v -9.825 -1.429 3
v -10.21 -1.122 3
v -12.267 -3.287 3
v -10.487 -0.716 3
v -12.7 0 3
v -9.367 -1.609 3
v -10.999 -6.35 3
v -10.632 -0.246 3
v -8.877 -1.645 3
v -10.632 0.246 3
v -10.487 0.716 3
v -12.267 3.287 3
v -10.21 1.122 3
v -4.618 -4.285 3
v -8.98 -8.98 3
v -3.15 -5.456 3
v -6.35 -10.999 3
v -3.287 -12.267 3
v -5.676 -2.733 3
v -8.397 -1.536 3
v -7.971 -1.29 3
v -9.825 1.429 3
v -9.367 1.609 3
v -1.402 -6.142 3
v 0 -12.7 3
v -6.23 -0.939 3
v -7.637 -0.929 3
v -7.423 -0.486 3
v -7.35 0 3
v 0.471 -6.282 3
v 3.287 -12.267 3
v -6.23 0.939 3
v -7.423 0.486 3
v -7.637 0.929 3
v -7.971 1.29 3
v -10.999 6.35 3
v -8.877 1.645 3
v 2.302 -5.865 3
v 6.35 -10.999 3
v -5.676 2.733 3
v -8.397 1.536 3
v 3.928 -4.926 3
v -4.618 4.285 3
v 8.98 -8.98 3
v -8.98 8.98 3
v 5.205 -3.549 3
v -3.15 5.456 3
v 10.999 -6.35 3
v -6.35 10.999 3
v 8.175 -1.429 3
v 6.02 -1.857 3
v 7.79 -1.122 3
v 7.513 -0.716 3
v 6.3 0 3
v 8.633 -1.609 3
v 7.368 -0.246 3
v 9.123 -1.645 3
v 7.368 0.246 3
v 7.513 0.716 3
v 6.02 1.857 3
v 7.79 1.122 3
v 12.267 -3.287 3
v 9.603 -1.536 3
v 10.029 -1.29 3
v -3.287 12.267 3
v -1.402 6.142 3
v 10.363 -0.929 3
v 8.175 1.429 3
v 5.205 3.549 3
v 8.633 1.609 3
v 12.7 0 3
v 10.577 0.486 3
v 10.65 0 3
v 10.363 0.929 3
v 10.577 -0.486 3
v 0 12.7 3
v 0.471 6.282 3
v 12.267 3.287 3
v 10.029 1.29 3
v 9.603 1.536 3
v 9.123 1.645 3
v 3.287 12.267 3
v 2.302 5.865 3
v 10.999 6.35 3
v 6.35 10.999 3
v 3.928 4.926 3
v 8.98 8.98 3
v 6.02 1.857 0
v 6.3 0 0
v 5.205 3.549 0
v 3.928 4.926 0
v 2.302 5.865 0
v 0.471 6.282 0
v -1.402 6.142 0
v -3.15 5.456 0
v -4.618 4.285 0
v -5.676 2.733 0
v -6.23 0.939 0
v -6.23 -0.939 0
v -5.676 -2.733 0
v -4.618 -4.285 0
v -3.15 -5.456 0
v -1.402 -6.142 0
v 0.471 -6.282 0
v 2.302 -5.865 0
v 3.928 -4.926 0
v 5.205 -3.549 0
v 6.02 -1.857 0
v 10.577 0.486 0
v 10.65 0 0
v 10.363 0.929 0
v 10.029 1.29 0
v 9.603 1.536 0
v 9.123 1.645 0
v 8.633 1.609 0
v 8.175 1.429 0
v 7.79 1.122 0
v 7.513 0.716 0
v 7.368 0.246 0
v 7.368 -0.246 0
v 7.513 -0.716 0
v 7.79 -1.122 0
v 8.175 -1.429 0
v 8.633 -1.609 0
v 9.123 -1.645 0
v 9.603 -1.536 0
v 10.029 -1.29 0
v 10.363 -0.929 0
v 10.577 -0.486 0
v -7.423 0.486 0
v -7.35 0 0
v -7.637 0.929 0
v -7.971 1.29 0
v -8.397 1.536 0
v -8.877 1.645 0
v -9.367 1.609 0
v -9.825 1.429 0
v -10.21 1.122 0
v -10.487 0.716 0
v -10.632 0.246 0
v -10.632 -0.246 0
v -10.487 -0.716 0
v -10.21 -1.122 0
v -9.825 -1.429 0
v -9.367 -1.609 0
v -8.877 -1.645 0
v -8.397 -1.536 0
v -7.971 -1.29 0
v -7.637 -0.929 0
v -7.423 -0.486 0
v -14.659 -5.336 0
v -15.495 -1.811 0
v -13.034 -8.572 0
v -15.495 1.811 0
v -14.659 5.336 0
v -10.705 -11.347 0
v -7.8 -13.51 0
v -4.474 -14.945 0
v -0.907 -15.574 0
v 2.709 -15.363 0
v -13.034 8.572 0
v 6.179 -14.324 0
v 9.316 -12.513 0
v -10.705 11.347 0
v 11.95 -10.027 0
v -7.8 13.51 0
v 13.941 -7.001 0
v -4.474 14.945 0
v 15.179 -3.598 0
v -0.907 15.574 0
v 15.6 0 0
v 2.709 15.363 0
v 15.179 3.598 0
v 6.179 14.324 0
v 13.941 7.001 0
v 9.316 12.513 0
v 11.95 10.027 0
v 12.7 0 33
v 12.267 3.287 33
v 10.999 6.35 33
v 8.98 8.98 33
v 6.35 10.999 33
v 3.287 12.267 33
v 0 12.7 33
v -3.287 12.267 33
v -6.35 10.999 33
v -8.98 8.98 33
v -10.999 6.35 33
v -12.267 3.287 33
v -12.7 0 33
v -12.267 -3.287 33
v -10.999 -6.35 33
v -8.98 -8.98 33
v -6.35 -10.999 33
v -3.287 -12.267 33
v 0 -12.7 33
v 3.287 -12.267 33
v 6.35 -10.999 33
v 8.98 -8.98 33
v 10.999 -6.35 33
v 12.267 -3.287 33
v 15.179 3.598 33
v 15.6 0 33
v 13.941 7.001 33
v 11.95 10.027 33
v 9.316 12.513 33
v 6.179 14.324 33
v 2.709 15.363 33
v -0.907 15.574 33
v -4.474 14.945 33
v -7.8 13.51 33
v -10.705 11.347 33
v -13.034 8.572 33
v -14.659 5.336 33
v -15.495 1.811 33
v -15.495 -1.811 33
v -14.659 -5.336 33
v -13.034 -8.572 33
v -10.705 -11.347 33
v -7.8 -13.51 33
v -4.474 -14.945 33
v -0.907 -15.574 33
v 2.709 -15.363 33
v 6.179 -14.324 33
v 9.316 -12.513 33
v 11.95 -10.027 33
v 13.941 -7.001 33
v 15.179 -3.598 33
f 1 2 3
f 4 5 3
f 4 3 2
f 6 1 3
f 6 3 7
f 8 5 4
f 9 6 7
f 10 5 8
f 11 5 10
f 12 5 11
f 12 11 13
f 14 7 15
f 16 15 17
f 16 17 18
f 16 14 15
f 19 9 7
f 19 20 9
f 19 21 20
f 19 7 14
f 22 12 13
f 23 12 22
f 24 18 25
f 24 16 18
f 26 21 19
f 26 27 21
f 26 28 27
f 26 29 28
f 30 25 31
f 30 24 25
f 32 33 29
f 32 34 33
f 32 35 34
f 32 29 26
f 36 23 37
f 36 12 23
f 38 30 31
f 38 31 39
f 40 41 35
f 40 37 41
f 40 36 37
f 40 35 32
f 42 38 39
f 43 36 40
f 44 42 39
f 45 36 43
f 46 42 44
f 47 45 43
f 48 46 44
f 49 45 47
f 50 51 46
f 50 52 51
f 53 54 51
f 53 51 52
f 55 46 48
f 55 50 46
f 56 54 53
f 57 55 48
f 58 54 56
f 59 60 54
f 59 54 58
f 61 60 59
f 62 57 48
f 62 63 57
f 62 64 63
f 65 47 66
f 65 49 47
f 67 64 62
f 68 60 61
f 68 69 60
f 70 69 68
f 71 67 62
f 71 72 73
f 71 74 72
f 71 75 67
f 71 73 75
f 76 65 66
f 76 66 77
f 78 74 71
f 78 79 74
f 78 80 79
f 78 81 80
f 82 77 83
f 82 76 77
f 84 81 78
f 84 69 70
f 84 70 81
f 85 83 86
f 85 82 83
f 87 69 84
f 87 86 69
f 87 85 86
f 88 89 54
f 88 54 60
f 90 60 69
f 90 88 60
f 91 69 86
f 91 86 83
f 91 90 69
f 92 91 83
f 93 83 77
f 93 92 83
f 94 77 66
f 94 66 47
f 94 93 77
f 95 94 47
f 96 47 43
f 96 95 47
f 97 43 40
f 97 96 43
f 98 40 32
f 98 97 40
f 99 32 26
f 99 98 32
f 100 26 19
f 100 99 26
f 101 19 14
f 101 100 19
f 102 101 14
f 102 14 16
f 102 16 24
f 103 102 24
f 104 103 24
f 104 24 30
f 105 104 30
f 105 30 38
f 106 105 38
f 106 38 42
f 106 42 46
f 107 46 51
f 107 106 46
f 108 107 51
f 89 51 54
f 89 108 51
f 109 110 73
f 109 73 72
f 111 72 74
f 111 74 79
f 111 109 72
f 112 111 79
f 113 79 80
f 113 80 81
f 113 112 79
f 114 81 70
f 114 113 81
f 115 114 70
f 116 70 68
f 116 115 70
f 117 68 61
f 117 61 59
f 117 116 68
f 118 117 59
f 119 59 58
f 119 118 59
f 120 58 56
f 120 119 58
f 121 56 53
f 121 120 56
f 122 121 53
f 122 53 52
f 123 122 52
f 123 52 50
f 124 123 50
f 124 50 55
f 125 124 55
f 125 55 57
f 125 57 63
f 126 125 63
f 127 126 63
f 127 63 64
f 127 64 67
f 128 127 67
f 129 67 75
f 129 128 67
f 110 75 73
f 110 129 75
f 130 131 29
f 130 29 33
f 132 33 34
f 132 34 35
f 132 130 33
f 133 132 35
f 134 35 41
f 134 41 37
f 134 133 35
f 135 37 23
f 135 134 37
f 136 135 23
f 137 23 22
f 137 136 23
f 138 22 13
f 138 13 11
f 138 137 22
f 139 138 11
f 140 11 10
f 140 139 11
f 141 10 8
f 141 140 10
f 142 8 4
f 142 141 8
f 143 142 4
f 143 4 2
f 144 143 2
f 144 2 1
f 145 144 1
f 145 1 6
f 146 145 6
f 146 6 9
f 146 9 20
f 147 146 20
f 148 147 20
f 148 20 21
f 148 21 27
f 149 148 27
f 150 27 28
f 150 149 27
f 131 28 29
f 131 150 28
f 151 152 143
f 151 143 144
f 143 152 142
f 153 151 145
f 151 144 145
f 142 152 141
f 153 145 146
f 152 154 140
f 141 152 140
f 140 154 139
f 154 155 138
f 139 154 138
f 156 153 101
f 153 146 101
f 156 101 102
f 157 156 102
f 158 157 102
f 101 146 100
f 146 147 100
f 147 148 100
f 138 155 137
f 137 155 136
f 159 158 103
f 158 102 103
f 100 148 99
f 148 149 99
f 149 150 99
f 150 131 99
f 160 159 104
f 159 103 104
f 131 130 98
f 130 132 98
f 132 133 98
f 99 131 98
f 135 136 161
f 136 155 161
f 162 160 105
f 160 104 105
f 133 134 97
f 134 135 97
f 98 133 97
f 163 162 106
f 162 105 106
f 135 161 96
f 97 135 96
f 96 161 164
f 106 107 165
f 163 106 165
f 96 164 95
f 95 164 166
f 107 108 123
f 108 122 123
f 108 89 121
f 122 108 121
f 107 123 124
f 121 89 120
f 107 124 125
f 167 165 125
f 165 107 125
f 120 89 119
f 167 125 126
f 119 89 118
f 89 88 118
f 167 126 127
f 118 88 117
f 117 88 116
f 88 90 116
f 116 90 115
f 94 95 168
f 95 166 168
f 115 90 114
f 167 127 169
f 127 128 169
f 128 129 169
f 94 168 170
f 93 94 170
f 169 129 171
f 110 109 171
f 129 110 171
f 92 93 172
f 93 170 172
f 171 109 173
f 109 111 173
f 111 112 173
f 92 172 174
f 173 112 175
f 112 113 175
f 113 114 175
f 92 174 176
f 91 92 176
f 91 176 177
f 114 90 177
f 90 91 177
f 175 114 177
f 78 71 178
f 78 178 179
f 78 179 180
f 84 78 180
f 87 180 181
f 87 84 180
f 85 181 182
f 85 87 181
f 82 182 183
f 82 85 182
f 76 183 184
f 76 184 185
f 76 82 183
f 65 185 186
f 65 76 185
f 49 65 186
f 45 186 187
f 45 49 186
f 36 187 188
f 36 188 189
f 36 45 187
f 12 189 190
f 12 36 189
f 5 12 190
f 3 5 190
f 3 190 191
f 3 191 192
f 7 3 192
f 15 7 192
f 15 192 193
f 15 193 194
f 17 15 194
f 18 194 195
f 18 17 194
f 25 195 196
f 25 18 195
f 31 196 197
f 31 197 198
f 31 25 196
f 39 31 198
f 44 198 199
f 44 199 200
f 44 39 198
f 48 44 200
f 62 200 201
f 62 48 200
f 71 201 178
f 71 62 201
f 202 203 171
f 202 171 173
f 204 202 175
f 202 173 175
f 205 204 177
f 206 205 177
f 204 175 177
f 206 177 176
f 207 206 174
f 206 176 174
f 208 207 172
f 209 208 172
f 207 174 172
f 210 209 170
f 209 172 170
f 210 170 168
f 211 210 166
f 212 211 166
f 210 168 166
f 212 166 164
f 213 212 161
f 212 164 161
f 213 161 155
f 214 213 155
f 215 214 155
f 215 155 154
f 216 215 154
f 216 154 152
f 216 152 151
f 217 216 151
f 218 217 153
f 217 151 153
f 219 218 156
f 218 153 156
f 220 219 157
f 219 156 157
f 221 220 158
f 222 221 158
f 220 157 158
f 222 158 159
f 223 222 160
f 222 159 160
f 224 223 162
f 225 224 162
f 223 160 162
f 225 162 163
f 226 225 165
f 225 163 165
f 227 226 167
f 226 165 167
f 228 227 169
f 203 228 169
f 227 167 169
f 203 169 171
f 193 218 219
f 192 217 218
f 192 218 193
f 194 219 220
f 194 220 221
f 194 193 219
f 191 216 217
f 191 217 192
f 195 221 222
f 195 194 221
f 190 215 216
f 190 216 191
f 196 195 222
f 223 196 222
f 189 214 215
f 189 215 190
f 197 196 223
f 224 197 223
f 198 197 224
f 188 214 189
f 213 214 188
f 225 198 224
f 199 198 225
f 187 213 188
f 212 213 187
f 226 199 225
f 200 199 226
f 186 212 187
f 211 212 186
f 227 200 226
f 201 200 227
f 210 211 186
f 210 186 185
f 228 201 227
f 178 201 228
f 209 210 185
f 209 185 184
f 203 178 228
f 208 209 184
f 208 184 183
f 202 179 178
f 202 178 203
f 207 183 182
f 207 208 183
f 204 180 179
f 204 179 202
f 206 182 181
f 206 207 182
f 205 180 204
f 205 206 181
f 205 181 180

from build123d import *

# Parameters (mm, degrees)
SKETCH_1_R      = 15.6
SKETCH_1_R_2    = 12.6
SKETCH_1_R_3    = 6.3
SKETCH_1_R_4    = 1.65
EXTRUDE_1_DEPTH = 3
SKETCH_2_R      = 15.6
SKETCH_2_R_2    = 12.7
EXTRUDE_2_DEPTH = 30


with BuildPart() as part:
    # 草图1 → 凸台-拉伸1 (new body)
    # profile 1 of 2: a face of its own
    with BuildSketch(Plane.XY):
        Circle(SKETCH_1_R)
        Circle(SKETCH_1_R_2, mode=Mode.SUBTRACT)
    # profile 2 of 2: a face of its own
    with BuildSketch(Plane.XY):
        Circle(SKETCH_1_R_2)
        Circle(SKETCH_1_R_3, mode=Mode.SUBTRACT)
        with Locations((-9, 0)):
            Circle(SKETCH_1_R_4, mode=Mode.SUBTRACT)
        with Locations((9, 0)):
            Circle(SKETCH_1_R_4, mode=Mode.SUBTRACT)
    extrude(amount=EXTRUDE_1_DEPTH)

    # 草图2 → 凸台-拉伸2 (add)
    with BuildSketch(Plane.XY.offset(3)):
        Circle(SKETCH_2_R)
        Circle(SKETCH_2_R_2, mode=Mode.SUBTRACT)
    extrude(amount=EXTRUDE_2_DEPTH)


solid = part.part
